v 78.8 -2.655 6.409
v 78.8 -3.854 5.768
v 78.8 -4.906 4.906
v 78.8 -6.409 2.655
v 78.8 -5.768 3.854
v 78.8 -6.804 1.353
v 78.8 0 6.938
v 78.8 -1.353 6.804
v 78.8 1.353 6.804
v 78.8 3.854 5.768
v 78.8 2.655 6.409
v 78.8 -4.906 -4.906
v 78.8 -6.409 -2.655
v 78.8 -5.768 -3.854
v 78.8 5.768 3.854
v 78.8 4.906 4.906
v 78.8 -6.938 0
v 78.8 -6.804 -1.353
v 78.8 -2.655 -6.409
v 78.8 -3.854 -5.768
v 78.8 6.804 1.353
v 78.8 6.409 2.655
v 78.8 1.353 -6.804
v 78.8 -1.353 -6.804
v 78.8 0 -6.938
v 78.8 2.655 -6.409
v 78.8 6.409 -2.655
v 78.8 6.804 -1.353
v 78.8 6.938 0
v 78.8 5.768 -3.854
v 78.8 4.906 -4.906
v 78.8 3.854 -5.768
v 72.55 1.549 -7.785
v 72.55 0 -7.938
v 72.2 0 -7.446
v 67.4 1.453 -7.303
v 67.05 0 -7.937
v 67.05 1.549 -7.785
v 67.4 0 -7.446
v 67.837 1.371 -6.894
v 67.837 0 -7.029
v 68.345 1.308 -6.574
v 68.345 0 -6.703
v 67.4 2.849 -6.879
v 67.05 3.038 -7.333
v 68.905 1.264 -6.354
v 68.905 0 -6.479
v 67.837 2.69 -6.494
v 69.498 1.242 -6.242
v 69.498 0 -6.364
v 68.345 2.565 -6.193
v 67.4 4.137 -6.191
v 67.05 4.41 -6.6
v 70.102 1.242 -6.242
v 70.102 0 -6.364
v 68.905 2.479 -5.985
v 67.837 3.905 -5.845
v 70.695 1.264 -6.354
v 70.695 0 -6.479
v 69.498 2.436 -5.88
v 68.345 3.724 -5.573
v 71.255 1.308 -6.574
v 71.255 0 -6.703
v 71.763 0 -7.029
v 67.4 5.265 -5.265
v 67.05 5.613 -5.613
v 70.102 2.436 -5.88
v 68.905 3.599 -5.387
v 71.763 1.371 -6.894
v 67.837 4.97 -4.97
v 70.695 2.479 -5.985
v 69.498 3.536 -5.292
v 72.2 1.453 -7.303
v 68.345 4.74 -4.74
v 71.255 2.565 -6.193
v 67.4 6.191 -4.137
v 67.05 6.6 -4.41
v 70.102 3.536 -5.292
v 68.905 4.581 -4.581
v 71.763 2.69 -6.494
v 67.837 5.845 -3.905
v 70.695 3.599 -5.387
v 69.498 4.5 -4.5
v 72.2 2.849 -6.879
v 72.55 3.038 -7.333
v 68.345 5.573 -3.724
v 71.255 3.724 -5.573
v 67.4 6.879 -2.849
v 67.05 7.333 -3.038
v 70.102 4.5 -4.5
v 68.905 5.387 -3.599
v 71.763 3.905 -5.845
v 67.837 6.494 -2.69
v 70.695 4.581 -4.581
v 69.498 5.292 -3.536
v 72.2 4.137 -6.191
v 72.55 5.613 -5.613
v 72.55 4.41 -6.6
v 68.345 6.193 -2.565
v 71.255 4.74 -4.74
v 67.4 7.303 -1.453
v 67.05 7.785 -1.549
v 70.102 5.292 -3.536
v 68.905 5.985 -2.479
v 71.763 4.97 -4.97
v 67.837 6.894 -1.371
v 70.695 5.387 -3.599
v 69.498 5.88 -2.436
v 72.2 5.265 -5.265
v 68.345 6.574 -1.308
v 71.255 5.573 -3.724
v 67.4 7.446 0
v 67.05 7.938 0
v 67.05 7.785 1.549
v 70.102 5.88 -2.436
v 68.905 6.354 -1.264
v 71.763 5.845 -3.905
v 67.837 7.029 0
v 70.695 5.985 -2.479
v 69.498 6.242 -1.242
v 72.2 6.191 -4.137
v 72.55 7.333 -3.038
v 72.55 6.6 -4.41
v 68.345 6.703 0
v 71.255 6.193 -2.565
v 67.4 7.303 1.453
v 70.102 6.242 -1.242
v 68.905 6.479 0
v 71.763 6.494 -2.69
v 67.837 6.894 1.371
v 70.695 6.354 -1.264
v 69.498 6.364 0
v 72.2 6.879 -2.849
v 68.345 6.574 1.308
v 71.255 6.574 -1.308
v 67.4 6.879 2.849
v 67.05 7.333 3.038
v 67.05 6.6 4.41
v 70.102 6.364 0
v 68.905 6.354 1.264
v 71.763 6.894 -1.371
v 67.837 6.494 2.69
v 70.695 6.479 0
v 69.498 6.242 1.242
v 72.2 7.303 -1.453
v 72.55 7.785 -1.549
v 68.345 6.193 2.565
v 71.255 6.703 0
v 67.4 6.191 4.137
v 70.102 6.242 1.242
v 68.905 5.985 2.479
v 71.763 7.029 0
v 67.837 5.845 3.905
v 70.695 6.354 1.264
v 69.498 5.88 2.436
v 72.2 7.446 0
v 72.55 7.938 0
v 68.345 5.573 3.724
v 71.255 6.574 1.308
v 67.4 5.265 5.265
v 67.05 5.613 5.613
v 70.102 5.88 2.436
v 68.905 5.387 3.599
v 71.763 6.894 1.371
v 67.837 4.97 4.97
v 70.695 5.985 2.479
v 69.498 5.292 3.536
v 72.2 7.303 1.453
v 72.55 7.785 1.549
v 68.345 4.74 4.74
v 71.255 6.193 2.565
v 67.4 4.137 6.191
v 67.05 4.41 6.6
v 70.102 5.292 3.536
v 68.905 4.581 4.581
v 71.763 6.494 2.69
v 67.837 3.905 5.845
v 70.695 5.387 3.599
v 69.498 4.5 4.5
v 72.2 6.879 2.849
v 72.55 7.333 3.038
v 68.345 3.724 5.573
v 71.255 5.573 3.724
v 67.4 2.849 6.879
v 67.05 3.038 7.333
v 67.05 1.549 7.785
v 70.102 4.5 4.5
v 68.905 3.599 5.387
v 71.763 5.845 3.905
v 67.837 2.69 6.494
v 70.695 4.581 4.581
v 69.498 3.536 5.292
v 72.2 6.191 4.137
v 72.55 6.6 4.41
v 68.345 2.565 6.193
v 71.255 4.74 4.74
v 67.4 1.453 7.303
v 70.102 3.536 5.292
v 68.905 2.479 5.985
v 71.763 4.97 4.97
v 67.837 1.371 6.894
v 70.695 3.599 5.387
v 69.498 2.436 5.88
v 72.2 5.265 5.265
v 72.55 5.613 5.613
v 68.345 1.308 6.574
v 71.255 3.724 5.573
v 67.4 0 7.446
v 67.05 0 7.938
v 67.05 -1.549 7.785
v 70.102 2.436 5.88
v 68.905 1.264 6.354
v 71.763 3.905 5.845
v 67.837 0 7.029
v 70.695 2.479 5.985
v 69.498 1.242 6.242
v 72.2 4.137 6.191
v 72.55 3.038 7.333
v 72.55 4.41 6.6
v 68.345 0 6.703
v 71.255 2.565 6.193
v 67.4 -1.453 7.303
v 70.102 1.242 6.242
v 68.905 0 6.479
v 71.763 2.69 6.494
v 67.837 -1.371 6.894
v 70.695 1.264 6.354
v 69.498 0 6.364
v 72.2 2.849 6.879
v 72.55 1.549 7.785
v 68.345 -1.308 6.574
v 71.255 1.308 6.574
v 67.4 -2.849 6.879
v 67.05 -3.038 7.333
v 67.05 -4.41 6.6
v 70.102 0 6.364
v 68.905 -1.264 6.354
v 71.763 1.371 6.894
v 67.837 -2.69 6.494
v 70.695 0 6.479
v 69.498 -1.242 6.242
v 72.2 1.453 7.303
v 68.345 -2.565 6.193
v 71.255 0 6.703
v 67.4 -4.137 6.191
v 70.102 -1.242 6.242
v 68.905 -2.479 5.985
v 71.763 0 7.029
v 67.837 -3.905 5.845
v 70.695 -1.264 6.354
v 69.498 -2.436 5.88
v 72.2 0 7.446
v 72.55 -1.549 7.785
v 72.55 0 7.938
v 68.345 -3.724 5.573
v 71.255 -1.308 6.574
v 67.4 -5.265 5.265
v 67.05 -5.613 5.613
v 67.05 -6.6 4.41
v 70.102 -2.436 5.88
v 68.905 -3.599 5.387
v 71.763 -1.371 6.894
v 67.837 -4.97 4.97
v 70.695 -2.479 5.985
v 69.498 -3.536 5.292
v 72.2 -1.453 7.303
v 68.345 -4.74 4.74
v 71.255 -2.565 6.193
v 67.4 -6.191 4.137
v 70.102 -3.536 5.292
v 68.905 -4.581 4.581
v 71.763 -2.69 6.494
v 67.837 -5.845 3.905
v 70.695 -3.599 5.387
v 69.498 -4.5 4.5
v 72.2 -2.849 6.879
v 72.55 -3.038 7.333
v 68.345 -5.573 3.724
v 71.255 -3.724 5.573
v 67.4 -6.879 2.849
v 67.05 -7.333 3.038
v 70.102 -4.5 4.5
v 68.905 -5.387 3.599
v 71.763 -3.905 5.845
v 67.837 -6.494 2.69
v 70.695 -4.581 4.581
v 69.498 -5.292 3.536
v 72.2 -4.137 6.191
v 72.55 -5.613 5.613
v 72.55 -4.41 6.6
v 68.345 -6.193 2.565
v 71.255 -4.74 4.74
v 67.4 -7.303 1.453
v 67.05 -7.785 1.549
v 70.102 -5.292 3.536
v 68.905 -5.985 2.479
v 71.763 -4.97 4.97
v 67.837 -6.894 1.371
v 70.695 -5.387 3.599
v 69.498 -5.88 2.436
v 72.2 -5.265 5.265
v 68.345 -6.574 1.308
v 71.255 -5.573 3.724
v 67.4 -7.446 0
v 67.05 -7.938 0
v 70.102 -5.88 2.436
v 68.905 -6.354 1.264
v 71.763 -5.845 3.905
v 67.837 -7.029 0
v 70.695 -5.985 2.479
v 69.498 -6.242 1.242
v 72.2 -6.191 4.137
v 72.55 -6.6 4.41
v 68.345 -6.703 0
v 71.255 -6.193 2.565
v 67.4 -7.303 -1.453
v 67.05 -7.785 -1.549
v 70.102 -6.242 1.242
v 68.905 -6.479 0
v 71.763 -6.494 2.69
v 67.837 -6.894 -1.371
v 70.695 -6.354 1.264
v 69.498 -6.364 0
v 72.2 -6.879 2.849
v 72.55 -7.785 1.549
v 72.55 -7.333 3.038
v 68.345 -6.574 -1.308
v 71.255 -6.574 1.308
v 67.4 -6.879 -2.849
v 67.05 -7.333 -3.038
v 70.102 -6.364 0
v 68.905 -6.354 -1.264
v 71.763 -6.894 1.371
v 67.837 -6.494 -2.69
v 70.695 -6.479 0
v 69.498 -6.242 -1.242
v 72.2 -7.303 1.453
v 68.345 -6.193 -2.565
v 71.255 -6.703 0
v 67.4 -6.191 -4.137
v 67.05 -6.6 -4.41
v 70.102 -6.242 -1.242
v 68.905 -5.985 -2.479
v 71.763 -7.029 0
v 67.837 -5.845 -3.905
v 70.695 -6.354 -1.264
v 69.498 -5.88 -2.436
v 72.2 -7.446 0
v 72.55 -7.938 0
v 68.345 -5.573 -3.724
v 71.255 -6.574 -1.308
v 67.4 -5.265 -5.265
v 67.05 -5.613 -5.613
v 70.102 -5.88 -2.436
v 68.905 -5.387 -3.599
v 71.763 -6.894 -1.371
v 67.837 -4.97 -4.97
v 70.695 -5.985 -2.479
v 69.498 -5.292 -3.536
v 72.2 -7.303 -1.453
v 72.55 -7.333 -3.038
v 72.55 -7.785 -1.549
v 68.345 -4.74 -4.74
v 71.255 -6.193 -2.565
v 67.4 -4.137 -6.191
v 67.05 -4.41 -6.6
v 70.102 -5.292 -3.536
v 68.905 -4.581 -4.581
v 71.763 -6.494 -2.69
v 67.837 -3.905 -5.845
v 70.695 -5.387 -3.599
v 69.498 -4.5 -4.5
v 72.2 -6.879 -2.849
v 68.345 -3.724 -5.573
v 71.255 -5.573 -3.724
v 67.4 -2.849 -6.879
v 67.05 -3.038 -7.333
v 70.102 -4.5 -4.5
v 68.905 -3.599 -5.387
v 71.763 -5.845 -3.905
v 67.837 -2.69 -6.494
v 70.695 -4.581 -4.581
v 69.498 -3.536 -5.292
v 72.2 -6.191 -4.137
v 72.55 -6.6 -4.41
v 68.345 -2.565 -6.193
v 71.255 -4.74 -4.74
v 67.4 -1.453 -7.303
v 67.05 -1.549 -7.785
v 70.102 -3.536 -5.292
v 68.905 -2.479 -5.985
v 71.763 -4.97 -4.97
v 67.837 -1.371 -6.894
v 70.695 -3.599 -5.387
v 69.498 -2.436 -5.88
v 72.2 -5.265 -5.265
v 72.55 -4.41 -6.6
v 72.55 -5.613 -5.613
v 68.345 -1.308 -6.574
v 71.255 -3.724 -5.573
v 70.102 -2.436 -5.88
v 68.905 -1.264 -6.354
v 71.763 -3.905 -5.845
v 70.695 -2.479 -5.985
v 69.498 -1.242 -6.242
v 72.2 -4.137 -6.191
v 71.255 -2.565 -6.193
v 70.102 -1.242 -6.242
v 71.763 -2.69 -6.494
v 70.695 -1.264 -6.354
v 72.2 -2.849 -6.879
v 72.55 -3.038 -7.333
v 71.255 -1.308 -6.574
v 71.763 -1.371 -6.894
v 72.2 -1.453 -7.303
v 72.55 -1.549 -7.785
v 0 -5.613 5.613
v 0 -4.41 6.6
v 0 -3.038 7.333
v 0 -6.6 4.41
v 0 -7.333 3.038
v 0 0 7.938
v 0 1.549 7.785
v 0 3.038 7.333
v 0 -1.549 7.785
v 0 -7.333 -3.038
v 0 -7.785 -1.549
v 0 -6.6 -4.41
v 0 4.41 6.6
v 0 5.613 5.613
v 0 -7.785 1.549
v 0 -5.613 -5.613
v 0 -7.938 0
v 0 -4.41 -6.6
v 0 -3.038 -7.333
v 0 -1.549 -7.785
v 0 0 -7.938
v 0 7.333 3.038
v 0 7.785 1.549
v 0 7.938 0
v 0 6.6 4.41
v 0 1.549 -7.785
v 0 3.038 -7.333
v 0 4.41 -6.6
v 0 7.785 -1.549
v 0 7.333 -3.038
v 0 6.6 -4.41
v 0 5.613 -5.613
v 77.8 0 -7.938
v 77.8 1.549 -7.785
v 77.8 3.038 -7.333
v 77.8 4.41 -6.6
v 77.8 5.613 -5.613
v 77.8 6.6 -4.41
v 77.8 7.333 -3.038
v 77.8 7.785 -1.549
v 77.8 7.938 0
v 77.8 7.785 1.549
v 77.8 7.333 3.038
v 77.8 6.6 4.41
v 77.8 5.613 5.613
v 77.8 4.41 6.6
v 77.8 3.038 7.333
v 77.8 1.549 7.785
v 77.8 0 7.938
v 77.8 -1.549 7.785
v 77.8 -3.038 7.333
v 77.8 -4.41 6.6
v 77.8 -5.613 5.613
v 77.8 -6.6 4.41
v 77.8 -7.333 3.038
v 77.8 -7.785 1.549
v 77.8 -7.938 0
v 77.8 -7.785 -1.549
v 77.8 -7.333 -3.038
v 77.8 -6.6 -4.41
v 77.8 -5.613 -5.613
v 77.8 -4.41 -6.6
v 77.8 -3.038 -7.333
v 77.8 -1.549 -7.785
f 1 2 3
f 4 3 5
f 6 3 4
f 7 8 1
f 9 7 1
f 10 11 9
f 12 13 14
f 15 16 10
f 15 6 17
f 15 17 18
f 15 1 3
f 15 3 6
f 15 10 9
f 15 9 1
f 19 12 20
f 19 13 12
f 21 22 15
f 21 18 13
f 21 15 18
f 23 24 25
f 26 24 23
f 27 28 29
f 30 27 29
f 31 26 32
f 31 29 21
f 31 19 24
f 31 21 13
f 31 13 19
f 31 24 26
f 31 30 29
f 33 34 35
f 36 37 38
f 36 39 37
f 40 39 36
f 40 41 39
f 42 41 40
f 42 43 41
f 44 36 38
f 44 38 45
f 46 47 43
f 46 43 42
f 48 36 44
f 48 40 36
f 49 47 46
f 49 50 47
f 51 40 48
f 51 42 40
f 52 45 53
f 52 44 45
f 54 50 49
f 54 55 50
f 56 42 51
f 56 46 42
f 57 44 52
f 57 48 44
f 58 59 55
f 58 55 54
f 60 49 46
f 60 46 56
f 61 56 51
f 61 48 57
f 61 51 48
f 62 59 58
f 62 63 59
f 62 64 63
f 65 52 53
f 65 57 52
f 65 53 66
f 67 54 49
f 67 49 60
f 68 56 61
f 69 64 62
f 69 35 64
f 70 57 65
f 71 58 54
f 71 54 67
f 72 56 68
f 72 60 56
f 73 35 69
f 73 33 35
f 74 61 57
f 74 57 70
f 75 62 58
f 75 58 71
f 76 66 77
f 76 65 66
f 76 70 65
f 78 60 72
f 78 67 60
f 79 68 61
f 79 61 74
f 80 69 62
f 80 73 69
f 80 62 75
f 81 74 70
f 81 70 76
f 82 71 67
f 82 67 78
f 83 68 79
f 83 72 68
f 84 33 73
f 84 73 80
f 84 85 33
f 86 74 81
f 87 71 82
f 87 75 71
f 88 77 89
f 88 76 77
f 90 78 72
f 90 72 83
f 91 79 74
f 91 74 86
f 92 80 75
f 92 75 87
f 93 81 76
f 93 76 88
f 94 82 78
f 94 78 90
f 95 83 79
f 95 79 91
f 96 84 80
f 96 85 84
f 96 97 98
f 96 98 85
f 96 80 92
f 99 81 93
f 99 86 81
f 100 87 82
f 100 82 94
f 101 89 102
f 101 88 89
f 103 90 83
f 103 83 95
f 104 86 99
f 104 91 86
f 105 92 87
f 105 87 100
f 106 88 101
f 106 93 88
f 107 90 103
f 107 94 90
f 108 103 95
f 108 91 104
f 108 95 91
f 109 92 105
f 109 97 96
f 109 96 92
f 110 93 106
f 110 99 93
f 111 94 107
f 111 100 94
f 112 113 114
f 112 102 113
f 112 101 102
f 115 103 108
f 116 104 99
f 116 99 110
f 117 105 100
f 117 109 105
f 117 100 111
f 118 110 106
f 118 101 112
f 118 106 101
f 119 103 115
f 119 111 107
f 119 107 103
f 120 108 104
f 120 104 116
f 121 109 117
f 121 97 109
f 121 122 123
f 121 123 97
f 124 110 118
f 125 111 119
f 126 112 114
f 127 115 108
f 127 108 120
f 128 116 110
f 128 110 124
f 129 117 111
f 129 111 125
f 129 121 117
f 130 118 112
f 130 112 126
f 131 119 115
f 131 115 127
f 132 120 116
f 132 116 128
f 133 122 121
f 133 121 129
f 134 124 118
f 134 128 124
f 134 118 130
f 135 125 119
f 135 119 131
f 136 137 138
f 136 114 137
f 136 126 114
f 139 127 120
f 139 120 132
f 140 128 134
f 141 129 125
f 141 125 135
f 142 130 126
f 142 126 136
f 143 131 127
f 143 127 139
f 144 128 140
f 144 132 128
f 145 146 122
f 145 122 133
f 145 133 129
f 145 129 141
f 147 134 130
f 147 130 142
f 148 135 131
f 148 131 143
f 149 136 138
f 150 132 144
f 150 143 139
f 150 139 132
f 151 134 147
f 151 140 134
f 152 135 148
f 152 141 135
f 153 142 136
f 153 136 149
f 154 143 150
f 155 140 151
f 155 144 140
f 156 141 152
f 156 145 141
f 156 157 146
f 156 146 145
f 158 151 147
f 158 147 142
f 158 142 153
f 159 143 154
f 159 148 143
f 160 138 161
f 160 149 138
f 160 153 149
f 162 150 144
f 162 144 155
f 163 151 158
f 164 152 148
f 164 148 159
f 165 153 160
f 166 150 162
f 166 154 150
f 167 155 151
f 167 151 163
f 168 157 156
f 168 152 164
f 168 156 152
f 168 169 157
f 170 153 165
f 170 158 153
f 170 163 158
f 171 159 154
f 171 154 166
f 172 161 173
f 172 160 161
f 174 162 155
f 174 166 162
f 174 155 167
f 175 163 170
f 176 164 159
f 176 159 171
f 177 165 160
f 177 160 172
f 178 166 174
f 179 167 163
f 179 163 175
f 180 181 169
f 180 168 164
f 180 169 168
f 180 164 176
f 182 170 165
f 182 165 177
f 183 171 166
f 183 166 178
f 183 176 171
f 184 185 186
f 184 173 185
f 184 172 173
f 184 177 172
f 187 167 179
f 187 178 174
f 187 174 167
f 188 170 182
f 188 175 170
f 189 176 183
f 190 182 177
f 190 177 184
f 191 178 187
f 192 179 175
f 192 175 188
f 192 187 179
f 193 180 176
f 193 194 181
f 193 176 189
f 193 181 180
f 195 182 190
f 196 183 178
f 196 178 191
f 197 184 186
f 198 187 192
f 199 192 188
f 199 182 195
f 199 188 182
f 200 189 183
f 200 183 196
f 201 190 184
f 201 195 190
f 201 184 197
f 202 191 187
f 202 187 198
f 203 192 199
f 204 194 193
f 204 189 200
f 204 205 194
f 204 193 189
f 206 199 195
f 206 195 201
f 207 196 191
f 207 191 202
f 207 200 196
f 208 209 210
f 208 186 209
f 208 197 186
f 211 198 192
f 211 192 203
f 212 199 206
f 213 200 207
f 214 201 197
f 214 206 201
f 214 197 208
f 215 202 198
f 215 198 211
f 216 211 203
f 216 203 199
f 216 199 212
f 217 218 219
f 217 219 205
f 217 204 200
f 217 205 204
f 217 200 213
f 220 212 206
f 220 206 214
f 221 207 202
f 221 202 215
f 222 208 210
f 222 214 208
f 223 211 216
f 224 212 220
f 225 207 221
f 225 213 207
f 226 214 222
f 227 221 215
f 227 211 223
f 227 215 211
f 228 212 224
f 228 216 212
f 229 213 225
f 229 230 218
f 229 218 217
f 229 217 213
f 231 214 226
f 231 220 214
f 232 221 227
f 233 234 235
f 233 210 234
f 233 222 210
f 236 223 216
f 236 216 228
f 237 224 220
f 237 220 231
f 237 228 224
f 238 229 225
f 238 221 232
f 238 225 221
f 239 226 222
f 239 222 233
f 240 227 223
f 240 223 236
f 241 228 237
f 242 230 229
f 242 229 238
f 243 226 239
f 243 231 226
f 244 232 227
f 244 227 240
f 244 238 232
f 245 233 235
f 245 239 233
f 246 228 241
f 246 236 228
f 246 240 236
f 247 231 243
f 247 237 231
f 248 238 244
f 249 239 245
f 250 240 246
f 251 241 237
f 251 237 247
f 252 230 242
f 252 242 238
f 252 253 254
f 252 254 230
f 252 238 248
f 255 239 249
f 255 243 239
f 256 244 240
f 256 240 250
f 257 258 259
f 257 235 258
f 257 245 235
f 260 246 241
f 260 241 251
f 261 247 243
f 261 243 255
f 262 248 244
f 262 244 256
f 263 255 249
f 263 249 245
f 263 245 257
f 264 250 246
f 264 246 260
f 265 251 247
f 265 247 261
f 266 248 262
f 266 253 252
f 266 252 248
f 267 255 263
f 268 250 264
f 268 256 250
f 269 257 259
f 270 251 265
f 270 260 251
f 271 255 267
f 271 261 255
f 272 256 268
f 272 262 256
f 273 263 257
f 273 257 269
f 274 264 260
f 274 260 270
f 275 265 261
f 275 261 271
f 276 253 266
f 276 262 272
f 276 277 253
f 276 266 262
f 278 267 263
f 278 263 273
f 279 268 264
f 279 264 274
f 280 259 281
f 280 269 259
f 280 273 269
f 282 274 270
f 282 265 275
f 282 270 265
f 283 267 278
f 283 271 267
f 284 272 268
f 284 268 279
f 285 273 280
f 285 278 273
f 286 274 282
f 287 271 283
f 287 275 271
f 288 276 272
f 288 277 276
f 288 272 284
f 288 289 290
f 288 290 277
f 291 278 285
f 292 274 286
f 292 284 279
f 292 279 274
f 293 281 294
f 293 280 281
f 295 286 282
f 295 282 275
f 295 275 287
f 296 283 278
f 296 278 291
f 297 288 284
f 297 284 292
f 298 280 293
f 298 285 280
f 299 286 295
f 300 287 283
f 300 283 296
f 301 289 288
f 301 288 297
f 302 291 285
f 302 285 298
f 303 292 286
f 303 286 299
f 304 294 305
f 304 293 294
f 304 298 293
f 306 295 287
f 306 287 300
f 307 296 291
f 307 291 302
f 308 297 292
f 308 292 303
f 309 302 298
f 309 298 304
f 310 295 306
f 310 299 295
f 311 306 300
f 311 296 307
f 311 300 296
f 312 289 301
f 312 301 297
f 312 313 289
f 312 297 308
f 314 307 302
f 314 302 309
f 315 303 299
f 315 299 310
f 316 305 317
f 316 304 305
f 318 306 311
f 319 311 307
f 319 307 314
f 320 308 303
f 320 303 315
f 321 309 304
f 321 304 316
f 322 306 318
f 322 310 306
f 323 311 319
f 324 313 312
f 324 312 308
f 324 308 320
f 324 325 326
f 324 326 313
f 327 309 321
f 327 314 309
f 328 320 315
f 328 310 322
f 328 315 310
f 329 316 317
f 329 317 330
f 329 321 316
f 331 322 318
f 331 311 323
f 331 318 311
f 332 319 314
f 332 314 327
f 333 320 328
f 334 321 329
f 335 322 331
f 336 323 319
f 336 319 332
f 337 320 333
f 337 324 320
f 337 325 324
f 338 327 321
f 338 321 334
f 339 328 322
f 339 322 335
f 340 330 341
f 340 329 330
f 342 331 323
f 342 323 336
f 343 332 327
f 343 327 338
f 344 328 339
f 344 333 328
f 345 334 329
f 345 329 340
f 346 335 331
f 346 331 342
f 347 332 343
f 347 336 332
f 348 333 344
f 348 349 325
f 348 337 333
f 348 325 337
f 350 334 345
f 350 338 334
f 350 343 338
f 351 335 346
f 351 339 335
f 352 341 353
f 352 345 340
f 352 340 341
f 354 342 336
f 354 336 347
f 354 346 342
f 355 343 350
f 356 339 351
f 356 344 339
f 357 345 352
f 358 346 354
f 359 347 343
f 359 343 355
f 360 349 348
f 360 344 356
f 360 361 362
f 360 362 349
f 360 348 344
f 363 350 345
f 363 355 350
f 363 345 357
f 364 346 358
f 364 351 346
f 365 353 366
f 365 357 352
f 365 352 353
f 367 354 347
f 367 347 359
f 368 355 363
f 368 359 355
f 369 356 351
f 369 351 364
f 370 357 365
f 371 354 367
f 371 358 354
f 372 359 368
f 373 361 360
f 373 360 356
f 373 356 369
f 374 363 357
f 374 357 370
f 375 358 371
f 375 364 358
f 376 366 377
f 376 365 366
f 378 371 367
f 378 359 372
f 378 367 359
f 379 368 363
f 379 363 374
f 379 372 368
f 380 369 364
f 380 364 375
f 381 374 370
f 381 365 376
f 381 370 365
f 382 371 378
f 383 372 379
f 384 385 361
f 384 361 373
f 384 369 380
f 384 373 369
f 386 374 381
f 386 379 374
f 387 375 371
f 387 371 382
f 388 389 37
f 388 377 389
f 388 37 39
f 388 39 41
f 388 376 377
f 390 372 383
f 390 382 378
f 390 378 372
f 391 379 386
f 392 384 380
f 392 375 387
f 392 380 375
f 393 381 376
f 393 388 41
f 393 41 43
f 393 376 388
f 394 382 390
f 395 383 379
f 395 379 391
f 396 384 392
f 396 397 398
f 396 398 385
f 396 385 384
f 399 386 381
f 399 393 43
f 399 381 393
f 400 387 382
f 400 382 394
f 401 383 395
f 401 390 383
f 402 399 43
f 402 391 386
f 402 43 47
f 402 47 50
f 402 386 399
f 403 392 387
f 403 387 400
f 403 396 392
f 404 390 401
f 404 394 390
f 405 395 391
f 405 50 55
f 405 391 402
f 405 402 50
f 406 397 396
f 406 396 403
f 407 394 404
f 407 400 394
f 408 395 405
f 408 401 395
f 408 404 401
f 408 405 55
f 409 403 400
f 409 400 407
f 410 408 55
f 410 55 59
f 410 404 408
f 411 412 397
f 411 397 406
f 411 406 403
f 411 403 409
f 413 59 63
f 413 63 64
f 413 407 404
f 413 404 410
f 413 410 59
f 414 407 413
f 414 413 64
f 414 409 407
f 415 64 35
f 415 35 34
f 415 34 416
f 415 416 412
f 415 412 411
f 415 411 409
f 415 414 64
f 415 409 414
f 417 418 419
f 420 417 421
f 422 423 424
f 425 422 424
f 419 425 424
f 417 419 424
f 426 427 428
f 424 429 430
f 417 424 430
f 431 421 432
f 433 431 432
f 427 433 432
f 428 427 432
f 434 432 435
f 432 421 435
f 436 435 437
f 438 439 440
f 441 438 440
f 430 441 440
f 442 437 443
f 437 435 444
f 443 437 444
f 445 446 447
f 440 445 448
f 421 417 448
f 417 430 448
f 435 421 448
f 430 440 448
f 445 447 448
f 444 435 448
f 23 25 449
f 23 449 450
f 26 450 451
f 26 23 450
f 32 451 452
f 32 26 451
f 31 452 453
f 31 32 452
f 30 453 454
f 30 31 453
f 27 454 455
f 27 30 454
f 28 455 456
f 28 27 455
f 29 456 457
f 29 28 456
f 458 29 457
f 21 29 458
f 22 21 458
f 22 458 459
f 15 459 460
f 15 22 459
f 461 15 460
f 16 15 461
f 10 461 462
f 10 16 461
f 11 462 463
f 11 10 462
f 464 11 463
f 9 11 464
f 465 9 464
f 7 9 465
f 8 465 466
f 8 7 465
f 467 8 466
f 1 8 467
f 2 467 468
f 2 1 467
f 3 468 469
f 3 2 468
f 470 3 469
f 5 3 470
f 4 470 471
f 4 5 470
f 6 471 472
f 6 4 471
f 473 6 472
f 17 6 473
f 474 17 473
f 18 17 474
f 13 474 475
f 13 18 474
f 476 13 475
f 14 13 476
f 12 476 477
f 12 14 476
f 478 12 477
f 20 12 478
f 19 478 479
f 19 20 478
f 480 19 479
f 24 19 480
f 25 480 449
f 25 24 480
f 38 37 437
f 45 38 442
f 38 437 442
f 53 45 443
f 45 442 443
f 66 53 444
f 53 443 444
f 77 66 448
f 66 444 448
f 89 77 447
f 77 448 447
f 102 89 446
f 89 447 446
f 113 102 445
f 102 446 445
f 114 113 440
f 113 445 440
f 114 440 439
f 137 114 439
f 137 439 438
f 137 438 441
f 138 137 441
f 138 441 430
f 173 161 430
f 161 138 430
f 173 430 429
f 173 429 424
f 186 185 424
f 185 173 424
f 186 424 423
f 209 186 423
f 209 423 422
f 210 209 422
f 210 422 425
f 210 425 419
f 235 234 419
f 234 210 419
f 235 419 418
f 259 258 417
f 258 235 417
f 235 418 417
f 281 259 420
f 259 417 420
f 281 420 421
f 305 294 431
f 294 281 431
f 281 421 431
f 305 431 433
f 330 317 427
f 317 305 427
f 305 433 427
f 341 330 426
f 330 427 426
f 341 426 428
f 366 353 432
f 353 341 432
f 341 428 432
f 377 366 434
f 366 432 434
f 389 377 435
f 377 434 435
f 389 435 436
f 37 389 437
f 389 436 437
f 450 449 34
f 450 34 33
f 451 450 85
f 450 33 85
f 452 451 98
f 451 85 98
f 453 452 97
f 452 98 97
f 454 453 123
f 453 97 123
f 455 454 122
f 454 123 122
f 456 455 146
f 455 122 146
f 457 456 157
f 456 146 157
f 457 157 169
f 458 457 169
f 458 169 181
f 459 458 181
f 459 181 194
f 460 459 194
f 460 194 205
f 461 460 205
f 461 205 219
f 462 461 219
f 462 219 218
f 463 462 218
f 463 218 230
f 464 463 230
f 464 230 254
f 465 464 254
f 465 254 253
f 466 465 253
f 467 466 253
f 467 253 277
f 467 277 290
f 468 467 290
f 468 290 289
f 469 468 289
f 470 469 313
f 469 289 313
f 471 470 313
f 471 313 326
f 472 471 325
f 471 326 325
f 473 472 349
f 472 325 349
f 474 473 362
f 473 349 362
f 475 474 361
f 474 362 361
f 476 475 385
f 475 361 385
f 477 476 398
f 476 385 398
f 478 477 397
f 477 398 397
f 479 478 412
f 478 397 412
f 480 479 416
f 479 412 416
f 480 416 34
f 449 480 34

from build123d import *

# Parameters (mm, degrees)
SKETCH1_R      = 7.9375
EXTRUDE1_DEPTH = 78.8
SKETCH2_R      = 3.175
CHAMFER1_SIZE  = 1


with BuildPart() as part:
    # Sketch1 → Extrude1 (new body)
    with BuildSketch(Plane(origin=(0, 0, 0), x_dir=(0, 0, -1), z_dir=(1, 0, 0))):
        Circle(SKETCH1_R)
    extrude(amount=EXTRUDE1_DEPTH)

    # Sketch2 → Cut-Revolve1 (revolve, cut)
    with BuildSketch(Plane(origin=(0, 0, 0), x_dir=(1, 0, 0), z_dir=(0, 1, 0))):
        with Locations((69.8, 9.525)):
            Circle(SKETCH2_R)
    revolve(axis=Axis((0, 0, 0), (1, 0, 0)), mode=Mode.SUBTRACT)

    # Chamfer1
    chamfer1_edges = [part.edges().sort_by_distance(p)[0] for p in [
        (78.8, 0, 7.9375),
    ]]
    chamfer(chamfer1_edges, length=CHAMFER1_SIZE)


solid = part.part
